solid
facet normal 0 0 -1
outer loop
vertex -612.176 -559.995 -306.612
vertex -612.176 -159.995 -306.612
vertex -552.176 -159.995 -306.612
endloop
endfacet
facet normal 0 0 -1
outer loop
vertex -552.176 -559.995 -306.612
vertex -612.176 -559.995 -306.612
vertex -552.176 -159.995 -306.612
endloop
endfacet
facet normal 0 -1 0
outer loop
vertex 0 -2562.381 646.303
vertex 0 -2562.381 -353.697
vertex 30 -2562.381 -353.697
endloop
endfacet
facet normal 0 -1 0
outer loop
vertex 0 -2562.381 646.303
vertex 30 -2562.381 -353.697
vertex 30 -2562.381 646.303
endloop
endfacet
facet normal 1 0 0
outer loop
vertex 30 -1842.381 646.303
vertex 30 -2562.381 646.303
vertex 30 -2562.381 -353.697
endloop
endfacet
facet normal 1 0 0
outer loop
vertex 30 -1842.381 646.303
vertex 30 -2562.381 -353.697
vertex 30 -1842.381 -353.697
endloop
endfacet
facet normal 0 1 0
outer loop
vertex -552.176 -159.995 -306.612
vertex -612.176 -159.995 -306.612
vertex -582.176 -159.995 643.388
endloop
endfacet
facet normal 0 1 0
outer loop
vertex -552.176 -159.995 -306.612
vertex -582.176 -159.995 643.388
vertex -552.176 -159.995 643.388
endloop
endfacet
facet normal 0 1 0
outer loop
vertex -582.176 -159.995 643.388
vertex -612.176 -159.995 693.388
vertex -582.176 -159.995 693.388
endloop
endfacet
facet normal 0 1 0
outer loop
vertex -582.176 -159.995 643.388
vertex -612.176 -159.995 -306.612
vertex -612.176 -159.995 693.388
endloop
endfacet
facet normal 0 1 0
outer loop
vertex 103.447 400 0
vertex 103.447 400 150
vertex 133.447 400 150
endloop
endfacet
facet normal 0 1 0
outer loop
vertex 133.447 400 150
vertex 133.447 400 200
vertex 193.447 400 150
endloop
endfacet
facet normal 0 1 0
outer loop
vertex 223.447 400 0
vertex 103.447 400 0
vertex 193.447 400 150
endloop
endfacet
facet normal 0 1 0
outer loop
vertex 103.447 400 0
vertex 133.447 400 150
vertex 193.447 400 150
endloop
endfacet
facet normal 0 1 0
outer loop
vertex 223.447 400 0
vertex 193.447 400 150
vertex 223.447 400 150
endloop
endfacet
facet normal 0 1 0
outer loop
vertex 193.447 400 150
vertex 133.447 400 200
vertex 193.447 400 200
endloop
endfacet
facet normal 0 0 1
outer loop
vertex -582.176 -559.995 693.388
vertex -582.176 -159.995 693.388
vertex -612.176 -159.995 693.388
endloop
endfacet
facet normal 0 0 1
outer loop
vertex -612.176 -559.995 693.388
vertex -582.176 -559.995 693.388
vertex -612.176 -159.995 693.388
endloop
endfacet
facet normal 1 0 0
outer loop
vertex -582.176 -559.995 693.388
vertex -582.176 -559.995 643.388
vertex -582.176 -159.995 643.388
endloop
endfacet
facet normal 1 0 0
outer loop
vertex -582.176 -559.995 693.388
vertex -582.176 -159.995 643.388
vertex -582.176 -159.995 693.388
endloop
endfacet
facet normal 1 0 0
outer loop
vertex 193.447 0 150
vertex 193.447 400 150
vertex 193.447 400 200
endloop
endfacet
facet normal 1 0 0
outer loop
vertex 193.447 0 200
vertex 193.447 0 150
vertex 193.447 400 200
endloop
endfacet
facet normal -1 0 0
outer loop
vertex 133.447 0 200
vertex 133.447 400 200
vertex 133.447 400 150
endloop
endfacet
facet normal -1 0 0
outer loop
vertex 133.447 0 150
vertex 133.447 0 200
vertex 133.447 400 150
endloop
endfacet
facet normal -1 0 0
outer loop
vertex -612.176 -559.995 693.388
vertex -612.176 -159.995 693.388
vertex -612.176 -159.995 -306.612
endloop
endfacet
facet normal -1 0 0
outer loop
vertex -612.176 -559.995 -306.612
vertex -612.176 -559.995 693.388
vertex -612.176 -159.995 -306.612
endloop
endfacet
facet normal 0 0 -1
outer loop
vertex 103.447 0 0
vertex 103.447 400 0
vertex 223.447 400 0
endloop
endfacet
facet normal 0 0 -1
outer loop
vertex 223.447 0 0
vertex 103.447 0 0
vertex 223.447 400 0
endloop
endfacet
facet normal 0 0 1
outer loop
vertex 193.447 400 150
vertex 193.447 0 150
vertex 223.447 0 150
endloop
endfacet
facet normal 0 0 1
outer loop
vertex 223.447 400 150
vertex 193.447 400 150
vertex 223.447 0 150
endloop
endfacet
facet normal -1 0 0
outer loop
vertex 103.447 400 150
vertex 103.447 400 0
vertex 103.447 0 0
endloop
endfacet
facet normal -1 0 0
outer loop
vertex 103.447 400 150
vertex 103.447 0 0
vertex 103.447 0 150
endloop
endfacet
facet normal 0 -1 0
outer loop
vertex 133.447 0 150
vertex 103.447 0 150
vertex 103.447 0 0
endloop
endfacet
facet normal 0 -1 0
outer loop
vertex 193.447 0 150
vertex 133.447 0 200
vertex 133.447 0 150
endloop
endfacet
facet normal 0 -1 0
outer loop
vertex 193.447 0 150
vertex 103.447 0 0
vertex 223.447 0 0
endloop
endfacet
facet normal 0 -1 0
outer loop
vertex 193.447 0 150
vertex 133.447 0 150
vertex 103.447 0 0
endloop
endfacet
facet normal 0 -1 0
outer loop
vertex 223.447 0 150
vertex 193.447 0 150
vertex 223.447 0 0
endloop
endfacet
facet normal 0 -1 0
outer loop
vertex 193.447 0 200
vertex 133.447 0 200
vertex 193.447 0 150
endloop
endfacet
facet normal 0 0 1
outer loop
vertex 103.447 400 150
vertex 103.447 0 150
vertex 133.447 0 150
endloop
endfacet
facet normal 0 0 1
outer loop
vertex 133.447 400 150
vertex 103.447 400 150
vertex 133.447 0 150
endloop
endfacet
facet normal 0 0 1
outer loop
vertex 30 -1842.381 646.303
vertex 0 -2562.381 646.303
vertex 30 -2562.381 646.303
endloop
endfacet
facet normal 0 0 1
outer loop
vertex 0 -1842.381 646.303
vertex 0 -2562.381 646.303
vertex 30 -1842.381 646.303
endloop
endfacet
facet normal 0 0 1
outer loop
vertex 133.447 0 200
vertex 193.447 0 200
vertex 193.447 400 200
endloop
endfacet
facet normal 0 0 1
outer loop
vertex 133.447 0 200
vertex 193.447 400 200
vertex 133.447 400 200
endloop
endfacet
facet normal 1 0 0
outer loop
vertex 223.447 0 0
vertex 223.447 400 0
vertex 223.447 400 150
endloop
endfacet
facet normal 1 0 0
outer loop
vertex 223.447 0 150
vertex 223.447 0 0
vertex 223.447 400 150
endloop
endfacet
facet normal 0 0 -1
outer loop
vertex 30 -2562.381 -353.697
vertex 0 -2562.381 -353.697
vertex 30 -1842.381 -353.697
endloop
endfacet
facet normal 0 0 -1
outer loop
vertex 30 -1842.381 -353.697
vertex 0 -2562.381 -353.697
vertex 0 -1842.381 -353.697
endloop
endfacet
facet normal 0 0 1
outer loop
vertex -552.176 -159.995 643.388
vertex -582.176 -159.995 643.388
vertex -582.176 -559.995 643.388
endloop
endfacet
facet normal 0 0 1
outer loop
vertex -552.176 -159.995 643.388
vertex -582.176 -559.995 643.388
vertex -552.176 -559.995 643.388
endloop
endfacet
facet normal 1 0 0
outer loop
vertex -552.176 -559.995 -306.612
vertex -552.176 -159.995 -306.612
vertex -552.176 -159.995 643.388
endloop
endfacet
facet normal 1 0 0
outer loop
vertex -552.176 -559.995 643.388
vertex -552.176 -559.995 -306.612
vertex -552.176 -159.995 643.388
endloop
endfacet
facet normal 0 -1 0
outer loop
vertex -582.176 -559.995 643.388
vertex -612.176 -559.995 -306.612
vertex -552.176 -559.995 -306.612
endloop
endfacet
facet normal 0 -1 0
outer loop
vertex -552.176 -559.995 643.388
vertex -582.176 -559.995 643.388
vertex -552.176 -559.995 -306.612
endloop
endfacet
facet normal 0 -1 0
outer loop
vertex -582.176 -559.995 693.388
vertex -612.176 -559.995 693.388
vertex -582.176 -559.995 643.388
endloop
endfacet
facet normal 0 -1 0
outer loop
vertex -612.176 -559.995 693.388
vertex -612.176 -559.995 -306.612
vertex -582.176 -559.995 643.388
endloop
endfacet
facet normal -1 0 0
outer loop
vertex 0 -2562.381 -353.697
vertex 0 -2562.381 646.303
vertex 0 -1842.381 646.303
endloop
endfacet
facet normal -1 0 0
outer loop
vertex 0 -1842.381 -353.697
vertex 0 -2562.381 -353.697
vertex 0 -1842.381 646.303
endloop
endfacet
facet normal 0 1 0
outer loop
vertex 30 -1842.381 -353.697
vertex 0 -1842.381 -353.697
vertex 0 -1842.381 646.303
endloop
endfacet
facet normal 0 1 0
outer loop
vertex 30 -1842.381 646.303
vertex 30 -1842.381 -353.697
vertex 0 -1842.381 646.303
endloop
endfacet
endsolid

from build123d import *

# Parameters (mm, degrees)
F0_W     = 400
F0_H     = 1000
F1_DEPTH = 50
F2_W     = 30
F2_H     = 950
F3_DEPTH = 400
F5_W     = 30
F5_H     = 150
F6_DEPTH = 400
F7_W     = 720
F7_H     = 1000
F8_DEPTH = 30


with BuildPart() as f1:
    # F0 (on Right) → F1 (new body)
    with BuildSketch(Plane.YZ):
        with Locations((40.004969, 177.131296)):
            Rectangle(F0_W, F0_H)
    extrude(amount=F1_DEPTH)


with BuildPart() as f3:
    # F2 (on face) → F3 (new body)
    with BuildSketch(Plane.XZ.offset(159.995031)):
        Polygon((-582.175538, 693.388123), (-612.175538, 693.388123), (-612.175538, -306.611877), (-582.175538, -306.611877), (-582.175538, 643.388123), align=None)
        with Locations((-567.175538, 168.388123)):
            Rectangle(F2_W, F2_H)
    extrude(amount=F3_DEPTH)


with BuildPart() as f6:
    # F5 (on Front) → F6 (new body)
    with BuildSketch(Plane.XZ):
        with Locations((208.447363, 75)):
            Rectangle(F5_W, F5_H)
        Polygon((193.447363, 200), (133.447363, 200), (133.447363, 150), (133.447363, 0), (193.447363, 0), (193.447363, 150), align=None)
        with Locations((118.447363, 75)):
            Rectangle(F5_W, F5_H)
    extrude(amount=-F6_DEPTH)


with BuildPart() as f8:
    # F7 (on face) → F8 (new body)
    with BuildSketch(Plane.YZ):
        with Locations((-2202.380761, 146.303445)):
            Rectangle(F7_W, F7_H)
    extrude(amount=F8_DEPTH)


solid = Compound([f3.part, f6.part, f8.part])
